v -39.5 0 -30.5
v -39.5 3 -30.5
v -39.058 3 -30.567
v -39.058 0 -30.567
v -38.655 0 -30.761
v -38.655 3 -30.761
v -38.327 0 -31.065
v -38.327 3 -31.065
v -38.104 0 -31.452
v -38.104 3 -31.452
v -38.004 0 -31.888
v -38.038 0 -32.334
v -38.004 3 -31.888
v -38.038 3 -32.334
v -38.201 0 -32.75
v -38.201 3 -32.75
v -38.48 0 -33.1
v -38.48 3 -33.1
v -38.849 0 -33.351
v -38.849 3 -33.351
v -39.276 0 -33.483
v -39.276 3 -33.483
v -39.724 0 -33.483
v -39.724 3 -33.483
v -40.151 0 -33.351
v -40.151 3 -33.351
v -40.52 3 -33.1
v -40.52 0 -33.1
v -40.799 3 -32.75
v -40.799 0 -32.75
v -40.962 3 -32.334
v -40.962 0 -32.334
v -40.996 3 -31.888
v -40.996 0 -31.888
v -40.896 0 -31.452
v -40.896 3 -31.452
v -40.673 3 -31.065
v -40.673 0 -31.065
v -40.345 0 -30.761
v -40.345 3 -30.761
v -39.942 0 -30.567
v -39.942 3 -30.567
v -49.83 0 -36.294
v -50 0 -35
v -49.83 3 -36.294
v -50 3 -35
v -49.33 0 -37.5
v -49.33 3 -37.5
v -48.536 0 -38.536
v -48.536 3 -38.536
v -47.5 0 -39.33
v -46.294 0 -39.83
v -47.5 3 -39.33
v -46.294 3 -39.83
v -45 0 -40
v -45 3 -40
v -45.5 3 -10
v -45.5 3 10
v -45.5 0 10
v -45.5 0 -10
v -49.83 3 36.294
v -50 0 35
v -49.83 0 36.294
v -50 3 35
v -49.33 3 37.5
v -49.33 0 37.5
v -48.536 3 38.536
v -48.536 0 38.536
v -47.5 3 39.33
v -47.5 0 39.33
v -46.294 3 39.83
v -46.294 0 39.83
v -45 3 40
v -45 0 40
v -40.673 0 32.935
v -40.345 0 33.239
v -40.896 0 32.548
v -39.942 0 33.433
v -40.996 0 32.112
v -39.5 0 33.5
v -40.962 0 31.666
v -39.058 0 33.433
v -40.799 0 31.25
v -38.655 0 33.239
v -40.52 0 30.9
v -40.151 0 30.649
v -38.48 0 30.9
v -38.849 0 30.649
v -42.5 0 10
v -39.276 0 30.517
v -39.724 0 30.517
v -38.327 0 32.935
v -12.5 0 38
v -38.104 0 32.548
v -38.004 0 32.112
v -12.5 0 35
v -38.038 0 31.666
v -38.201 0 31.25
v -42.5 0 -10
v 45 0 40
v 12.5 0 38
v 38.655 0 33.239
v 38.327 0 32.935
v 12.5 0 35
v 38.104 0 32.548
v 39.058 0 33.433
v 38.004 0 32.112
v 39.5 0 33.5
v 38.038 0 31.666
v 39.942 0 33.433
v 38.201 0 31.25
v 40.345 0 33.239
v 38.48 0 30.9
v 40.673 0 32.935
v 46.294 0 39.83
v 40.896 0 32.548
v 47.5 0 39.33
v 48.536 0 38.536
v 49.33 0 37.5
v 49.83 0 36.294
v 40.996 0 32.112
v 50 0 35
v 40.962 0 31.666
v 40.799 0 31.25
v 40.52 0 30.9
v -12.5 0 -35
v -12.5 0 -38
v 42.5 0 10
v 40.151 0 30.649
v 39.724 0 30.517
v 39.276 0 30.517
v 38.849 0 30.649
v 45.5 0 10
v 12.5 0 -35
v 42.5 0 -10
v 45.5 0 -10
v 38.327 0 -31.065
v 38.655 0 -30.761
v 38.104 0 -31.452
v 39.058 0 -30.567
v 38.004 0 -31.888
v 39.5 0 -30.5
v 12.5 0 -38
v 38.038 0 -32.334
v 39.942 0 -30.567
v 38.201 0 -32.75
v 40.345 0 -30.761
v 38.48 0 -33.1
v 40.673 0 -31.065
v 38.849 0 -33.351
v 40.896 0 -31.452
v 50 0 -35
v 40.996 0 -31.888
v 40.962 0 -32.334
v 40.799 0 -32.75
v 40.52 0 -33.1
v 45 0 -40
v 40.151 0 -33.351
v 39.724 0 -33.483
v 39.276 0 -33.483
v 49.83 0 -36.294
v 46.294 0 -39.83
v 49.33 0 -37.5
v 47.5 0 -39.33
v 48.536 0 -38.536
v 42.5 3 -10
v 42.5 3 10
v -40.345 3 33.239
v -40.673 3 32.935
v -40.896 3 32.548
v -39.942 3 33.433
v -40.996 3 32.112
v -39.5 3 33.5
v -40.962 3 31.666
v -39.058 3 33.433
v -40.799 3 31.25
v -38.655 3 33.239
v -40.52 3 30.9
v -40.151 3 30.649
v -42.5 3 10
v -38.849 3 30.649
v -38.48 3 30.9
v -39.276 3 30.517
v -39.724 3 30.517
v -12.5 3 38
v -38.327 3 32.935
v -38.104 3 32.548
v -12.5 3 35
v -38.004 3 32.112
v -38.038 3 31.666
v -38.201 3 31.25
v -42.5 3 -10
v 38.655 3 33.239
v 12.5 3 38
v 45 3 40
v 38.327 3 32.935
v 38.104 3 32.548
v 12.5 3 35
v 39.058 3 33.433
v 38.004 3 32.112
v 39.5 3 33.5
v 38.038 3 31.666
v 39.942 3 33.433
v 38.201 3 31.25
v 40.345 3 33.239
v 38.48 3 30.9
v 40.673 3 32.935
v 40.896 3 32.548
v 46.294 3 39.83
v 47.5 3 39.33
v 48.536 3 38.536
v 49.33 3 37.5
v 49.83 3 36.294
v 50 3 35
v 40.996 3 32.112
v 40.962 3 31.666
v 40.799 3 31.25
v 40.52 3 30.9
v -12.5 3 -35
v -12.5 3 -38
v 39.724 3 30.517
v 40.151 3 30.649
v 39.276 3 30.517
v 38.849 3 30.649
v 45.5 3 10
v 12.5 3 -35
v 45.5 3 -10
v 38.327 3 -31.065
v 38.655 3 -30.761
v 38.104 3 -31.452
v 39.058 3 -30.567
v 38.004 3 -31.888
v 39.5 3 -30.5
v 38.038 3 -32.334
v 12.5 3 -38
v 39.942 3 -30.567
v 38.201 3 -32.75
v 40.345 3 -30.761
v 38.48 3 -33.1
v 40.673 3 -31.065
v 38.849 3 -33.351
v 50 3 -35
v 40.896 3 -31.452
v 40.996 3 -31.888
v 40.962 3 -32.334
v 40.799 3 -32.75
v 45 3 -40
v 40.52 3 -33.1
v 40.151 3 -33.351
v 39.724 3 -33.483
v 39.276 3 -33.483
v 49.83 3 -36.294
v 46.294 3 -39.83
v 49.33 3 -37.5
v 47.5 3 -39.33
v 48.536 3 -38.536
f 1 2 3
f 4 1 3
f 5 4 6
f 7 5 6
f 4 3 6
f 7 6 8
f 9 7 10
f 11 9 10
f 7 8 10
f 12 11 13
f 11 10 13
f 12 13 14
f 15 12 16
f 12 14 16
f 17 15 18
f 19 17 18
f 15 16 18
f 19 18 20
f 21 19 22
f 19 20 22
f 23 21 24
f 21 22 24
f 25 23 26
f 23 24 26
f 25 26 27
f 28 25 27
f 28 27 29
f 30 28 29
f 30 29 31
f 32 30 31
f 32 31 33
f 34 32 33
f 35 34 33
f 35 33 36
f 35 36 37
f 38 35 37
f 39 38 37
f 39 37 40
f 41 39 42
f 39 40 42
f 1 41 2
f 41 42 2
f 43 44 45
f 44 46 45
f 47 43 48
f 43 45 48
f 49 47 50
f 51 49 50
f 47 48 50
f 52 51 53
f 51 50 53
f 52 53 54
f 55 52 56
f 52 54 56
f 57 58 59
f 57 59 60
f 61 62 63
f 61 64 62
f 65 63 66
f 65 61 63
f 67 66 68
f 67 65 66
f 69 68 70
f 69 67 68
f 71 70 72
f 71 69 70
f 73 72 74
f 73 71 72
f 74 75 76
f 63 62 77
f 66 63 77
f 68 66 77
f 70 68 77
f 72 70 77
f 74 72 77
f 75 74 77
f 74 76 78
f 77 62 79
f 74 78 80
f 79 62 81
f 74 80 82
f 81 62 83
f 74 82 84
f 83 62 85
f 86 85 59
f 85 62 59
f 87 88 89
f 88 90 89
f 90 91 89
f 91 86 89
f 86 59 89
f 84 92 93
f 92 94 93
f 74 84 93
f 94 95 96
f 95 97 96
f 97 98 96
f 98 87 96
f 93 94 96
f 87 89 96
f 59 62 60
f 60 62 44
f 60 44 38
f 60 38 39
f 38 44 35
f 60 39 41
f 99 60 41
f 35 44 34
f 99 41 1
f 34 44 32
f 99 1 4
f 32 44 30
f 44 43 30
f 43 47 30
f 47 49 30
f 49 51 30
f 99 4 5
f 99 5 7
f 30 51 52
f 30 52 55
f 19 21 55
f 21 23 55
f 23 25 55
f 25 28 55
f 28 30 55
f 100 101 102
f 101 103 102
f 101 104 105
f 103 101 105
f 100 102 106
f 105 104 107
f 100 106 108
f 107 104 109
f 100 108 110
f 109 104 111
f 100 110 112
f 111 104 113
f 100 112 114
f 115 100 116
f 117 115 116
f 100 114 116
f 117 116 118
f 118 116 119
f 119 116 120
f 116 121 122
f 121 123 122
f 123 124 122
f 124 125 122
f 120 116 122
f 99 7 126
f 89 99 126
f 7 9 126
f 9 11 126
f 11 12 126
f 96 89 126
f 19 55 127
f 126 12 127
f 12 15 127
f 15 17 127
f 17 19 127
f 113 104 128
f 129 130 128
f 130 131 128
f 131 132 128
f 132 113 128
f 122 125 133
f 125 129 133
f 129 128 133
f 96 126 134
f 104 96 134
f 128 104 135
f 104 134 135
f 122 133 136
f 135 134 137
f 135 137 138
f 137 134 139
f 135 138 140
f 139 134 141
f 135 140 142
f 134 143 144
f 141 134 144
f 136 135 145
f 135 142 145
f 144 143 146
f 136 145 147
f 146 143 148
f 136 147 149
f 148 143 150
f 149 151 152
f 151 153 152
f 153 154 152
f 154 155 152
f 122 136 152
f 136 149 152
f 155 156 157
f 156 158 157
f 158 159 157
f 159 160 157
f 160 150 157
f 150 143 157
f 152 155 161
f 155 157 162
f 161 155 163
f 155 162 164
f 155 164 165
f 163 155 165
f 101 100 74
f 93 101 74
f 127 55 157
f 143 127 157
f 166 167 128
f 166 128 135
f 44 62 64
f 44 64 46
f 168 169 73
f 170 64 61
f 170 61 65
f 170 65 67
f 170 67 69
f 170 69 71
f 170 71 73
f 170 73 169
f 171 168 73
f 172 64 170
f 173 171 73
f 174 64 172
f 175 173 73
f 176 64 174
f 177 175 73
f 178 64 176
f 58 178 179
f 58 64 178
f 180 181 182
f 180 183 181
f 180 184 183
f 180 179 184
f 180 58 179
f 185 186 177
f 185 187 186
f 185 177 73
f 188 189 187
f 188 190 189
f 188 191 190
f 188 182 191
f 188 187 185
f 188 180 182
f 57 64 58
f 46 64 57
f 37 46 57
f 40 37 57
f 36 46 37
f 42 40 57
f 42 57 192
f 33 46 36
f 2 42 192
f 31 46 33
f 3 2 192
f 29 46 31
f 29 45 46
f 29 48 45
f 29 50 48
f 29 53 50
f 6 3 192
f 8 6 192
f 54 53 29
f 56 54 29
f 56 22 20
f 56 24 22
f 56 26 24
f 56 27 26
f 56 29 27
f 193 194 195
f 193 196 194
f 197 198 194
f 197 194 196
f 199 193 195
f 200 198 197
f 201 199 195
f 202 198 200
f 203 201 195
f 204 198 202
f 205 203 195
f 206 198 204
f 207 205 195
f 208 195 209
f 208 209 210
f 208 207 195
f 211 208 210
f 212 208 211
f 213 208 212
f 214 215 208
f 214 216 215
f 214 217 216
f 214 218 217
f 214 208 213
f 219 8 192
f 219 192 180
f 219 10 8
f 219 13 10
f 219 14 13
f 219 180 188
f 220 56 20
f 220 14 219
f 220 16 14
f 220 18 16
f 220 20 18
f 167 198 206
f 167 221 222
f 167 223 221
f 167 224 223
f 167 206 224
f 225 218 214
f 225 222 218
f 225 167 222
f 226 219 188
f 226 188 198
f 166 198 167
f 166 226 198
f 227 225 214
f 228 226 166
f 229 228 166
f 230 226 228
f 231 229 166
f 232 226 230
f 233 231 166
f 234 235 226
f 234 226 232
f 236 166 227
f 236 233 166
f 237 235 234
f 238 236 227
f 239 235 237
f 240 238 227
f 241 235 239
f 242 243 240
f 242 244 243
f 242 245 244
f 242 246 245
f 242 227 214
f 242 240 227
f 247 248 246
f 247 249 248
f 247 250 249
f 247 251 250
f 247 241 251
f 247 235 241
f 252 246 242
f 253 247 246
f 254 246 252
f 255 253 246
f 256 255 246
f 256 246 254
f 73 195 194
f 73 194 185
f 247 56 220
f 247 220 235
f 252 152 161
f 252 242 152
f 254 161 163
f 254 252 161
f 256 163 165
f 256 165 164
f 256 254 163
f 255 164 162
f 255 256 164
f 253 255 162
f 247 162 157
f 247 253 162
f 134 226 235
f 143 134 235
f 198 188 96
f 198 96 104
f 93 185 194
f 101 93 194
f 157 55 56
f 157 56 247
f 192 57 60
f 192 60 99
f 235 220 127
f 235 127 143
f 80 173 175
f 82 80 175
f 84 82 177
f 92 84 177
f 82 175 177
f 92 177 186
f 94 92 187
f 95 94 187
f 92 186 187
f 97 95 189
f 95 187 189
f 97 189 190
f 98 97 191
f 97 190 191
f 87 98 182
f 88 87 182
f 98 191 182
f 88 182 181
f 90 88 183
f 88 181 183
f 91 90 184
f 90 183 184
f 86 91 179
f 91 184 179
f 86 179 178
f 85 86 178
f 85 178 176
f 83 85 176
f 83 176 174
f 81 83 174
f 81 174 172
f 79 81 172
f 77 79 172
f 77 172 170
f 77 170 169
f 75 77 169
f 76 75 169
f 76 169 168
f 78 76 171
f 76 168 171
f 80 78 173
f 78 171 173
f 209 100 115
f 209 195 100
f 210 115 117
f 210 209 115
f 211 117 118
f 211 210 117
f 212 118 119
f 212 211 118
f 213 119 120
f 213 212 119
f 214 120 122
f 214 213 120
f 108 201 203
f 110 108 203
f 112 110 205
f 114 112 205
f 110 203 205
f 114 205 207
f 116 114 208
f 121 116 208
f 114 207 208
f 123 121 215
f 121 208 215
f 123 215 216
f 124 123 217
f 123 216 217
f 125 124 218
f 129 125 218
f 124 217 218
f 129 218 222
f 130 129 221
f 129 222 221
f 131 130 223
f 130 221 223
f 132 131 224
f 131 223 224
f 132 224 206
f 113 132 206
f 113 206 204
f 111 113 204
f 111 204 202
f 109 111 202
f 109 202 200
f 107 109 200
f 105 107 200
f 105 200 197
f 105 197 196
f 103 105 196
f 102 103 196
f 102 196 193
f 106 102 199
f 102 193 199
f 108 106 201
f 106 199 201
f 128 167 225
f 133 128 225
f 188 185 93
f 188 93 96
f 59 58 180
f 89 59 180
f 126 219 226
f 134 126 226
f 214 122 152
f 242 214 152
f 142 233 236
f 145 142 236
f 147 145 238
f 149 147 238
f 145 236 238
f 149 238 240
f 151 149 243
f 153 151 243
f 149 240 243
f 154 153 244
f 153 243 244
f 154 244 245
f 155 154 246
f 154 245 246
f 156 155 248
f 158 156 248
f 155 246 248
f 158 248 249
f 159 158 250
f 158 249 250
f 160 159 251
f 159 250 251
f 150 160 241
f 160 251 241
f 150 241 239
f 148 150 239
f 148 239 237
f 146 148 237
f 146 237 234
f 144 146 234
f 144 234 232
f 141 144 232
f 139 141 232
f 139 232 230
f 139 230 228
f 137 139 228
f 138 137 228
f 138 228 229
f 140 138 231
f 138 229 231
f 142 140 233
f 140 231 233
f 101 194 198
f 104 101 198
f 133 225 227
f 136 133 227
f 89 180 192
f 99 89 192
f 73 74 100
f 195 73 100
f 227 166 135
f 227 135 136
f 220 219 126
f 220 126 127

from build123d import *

# Parameters (mm, degrees)
SKETCH1_W           = 100
SKETCH1_H           = 80
BOSS_EXTRUDE1_DEPTH = 3
FILLET1_R           = 5
SKETCH2_R           = 1.5
CUT_EXTRUDE1_DEPTH  = 3
SKETCH3_W           = 25
SKETCH3_H           = 3
SKETCH3_W_2         = 3
SKETCH3_H_2         = 20
CUT_EXTRUDE2_DEPTH  = 10


with BuildPart() as part:
    # Sketch1 → Boss-Extrude1 (new body)
    with BuildSketch(Plane(origin=(0, 0, 0), x_dir=(1, 0, 0), z_dir=(0, 1, 0))):
        Rectangle(SKETCH1_W, SKETCH1_H)
    extrude(amount=BOSS_EXTRUDE1_DEPTH)

    # Fillet1
    fillet1_edges = [part.edges().sort_by_distance(p)[0] for p in [
        (50, 1.5, 40),
        (-50, 1.5, 40),
        (-50, 1.5, -40),
        (50, 1.5, -40),
    ]]
    fillet(fillet1_edges, radius=FILLET1_R)

    # Sketch2 → Cut-Extrude1 (cut)
    with BuildSketch(Plane(origin=(0, 3, 0), x_dir=(1, 0, 0), z_dir=(0, 1, 0))):
        with Locations(Location((39.5, -32, 0), (0, 0, 270))):
            Circle(SKETCH2_R)
        with Locations(Location((39.5, 32, 0), (0, 0, 270))):
            Circle(SKETCH2_R)
        with Locations(Location((-39.5, 32, 0), (0, 0, 270))):
            Circle(SKETCH2_R)
        with Locations(Location((-39.5, -32, 0), (0, 0, 270))):
            Circle(SKETCH2_R)
    extrude(amount=-CUT_EXTRUDE1_DEPTH, mode=Mode.SUBTRACT)

    # Sketch3 → Cut-Extrude2 (cut)
    with BuildSketch(Plane(origin=(0, 3, 0), x_dir=(1, 0, 0), z_dir=(0, 1, 0))):
        with Locations((0, -36.5)):
            Rectangle(SKETCH3_W, SKETCH3_H)
        with Locations((0, 36.5)):
            Rectangle(SKETCH3_W, SKETCH3_H)
        with Locations((44, 0)):
            Rectangle(SKETCH3_W_2, SKETCH3_H_2)
        with Locations((-44, 0)):
            Rectangle(SKETCH3_W_2, SKETCH3_H_2)
    extrude(amount=-CUT_EXTRUDE2_DEPTH, mode=Mode.SUBTRACT)


solid = part.part
